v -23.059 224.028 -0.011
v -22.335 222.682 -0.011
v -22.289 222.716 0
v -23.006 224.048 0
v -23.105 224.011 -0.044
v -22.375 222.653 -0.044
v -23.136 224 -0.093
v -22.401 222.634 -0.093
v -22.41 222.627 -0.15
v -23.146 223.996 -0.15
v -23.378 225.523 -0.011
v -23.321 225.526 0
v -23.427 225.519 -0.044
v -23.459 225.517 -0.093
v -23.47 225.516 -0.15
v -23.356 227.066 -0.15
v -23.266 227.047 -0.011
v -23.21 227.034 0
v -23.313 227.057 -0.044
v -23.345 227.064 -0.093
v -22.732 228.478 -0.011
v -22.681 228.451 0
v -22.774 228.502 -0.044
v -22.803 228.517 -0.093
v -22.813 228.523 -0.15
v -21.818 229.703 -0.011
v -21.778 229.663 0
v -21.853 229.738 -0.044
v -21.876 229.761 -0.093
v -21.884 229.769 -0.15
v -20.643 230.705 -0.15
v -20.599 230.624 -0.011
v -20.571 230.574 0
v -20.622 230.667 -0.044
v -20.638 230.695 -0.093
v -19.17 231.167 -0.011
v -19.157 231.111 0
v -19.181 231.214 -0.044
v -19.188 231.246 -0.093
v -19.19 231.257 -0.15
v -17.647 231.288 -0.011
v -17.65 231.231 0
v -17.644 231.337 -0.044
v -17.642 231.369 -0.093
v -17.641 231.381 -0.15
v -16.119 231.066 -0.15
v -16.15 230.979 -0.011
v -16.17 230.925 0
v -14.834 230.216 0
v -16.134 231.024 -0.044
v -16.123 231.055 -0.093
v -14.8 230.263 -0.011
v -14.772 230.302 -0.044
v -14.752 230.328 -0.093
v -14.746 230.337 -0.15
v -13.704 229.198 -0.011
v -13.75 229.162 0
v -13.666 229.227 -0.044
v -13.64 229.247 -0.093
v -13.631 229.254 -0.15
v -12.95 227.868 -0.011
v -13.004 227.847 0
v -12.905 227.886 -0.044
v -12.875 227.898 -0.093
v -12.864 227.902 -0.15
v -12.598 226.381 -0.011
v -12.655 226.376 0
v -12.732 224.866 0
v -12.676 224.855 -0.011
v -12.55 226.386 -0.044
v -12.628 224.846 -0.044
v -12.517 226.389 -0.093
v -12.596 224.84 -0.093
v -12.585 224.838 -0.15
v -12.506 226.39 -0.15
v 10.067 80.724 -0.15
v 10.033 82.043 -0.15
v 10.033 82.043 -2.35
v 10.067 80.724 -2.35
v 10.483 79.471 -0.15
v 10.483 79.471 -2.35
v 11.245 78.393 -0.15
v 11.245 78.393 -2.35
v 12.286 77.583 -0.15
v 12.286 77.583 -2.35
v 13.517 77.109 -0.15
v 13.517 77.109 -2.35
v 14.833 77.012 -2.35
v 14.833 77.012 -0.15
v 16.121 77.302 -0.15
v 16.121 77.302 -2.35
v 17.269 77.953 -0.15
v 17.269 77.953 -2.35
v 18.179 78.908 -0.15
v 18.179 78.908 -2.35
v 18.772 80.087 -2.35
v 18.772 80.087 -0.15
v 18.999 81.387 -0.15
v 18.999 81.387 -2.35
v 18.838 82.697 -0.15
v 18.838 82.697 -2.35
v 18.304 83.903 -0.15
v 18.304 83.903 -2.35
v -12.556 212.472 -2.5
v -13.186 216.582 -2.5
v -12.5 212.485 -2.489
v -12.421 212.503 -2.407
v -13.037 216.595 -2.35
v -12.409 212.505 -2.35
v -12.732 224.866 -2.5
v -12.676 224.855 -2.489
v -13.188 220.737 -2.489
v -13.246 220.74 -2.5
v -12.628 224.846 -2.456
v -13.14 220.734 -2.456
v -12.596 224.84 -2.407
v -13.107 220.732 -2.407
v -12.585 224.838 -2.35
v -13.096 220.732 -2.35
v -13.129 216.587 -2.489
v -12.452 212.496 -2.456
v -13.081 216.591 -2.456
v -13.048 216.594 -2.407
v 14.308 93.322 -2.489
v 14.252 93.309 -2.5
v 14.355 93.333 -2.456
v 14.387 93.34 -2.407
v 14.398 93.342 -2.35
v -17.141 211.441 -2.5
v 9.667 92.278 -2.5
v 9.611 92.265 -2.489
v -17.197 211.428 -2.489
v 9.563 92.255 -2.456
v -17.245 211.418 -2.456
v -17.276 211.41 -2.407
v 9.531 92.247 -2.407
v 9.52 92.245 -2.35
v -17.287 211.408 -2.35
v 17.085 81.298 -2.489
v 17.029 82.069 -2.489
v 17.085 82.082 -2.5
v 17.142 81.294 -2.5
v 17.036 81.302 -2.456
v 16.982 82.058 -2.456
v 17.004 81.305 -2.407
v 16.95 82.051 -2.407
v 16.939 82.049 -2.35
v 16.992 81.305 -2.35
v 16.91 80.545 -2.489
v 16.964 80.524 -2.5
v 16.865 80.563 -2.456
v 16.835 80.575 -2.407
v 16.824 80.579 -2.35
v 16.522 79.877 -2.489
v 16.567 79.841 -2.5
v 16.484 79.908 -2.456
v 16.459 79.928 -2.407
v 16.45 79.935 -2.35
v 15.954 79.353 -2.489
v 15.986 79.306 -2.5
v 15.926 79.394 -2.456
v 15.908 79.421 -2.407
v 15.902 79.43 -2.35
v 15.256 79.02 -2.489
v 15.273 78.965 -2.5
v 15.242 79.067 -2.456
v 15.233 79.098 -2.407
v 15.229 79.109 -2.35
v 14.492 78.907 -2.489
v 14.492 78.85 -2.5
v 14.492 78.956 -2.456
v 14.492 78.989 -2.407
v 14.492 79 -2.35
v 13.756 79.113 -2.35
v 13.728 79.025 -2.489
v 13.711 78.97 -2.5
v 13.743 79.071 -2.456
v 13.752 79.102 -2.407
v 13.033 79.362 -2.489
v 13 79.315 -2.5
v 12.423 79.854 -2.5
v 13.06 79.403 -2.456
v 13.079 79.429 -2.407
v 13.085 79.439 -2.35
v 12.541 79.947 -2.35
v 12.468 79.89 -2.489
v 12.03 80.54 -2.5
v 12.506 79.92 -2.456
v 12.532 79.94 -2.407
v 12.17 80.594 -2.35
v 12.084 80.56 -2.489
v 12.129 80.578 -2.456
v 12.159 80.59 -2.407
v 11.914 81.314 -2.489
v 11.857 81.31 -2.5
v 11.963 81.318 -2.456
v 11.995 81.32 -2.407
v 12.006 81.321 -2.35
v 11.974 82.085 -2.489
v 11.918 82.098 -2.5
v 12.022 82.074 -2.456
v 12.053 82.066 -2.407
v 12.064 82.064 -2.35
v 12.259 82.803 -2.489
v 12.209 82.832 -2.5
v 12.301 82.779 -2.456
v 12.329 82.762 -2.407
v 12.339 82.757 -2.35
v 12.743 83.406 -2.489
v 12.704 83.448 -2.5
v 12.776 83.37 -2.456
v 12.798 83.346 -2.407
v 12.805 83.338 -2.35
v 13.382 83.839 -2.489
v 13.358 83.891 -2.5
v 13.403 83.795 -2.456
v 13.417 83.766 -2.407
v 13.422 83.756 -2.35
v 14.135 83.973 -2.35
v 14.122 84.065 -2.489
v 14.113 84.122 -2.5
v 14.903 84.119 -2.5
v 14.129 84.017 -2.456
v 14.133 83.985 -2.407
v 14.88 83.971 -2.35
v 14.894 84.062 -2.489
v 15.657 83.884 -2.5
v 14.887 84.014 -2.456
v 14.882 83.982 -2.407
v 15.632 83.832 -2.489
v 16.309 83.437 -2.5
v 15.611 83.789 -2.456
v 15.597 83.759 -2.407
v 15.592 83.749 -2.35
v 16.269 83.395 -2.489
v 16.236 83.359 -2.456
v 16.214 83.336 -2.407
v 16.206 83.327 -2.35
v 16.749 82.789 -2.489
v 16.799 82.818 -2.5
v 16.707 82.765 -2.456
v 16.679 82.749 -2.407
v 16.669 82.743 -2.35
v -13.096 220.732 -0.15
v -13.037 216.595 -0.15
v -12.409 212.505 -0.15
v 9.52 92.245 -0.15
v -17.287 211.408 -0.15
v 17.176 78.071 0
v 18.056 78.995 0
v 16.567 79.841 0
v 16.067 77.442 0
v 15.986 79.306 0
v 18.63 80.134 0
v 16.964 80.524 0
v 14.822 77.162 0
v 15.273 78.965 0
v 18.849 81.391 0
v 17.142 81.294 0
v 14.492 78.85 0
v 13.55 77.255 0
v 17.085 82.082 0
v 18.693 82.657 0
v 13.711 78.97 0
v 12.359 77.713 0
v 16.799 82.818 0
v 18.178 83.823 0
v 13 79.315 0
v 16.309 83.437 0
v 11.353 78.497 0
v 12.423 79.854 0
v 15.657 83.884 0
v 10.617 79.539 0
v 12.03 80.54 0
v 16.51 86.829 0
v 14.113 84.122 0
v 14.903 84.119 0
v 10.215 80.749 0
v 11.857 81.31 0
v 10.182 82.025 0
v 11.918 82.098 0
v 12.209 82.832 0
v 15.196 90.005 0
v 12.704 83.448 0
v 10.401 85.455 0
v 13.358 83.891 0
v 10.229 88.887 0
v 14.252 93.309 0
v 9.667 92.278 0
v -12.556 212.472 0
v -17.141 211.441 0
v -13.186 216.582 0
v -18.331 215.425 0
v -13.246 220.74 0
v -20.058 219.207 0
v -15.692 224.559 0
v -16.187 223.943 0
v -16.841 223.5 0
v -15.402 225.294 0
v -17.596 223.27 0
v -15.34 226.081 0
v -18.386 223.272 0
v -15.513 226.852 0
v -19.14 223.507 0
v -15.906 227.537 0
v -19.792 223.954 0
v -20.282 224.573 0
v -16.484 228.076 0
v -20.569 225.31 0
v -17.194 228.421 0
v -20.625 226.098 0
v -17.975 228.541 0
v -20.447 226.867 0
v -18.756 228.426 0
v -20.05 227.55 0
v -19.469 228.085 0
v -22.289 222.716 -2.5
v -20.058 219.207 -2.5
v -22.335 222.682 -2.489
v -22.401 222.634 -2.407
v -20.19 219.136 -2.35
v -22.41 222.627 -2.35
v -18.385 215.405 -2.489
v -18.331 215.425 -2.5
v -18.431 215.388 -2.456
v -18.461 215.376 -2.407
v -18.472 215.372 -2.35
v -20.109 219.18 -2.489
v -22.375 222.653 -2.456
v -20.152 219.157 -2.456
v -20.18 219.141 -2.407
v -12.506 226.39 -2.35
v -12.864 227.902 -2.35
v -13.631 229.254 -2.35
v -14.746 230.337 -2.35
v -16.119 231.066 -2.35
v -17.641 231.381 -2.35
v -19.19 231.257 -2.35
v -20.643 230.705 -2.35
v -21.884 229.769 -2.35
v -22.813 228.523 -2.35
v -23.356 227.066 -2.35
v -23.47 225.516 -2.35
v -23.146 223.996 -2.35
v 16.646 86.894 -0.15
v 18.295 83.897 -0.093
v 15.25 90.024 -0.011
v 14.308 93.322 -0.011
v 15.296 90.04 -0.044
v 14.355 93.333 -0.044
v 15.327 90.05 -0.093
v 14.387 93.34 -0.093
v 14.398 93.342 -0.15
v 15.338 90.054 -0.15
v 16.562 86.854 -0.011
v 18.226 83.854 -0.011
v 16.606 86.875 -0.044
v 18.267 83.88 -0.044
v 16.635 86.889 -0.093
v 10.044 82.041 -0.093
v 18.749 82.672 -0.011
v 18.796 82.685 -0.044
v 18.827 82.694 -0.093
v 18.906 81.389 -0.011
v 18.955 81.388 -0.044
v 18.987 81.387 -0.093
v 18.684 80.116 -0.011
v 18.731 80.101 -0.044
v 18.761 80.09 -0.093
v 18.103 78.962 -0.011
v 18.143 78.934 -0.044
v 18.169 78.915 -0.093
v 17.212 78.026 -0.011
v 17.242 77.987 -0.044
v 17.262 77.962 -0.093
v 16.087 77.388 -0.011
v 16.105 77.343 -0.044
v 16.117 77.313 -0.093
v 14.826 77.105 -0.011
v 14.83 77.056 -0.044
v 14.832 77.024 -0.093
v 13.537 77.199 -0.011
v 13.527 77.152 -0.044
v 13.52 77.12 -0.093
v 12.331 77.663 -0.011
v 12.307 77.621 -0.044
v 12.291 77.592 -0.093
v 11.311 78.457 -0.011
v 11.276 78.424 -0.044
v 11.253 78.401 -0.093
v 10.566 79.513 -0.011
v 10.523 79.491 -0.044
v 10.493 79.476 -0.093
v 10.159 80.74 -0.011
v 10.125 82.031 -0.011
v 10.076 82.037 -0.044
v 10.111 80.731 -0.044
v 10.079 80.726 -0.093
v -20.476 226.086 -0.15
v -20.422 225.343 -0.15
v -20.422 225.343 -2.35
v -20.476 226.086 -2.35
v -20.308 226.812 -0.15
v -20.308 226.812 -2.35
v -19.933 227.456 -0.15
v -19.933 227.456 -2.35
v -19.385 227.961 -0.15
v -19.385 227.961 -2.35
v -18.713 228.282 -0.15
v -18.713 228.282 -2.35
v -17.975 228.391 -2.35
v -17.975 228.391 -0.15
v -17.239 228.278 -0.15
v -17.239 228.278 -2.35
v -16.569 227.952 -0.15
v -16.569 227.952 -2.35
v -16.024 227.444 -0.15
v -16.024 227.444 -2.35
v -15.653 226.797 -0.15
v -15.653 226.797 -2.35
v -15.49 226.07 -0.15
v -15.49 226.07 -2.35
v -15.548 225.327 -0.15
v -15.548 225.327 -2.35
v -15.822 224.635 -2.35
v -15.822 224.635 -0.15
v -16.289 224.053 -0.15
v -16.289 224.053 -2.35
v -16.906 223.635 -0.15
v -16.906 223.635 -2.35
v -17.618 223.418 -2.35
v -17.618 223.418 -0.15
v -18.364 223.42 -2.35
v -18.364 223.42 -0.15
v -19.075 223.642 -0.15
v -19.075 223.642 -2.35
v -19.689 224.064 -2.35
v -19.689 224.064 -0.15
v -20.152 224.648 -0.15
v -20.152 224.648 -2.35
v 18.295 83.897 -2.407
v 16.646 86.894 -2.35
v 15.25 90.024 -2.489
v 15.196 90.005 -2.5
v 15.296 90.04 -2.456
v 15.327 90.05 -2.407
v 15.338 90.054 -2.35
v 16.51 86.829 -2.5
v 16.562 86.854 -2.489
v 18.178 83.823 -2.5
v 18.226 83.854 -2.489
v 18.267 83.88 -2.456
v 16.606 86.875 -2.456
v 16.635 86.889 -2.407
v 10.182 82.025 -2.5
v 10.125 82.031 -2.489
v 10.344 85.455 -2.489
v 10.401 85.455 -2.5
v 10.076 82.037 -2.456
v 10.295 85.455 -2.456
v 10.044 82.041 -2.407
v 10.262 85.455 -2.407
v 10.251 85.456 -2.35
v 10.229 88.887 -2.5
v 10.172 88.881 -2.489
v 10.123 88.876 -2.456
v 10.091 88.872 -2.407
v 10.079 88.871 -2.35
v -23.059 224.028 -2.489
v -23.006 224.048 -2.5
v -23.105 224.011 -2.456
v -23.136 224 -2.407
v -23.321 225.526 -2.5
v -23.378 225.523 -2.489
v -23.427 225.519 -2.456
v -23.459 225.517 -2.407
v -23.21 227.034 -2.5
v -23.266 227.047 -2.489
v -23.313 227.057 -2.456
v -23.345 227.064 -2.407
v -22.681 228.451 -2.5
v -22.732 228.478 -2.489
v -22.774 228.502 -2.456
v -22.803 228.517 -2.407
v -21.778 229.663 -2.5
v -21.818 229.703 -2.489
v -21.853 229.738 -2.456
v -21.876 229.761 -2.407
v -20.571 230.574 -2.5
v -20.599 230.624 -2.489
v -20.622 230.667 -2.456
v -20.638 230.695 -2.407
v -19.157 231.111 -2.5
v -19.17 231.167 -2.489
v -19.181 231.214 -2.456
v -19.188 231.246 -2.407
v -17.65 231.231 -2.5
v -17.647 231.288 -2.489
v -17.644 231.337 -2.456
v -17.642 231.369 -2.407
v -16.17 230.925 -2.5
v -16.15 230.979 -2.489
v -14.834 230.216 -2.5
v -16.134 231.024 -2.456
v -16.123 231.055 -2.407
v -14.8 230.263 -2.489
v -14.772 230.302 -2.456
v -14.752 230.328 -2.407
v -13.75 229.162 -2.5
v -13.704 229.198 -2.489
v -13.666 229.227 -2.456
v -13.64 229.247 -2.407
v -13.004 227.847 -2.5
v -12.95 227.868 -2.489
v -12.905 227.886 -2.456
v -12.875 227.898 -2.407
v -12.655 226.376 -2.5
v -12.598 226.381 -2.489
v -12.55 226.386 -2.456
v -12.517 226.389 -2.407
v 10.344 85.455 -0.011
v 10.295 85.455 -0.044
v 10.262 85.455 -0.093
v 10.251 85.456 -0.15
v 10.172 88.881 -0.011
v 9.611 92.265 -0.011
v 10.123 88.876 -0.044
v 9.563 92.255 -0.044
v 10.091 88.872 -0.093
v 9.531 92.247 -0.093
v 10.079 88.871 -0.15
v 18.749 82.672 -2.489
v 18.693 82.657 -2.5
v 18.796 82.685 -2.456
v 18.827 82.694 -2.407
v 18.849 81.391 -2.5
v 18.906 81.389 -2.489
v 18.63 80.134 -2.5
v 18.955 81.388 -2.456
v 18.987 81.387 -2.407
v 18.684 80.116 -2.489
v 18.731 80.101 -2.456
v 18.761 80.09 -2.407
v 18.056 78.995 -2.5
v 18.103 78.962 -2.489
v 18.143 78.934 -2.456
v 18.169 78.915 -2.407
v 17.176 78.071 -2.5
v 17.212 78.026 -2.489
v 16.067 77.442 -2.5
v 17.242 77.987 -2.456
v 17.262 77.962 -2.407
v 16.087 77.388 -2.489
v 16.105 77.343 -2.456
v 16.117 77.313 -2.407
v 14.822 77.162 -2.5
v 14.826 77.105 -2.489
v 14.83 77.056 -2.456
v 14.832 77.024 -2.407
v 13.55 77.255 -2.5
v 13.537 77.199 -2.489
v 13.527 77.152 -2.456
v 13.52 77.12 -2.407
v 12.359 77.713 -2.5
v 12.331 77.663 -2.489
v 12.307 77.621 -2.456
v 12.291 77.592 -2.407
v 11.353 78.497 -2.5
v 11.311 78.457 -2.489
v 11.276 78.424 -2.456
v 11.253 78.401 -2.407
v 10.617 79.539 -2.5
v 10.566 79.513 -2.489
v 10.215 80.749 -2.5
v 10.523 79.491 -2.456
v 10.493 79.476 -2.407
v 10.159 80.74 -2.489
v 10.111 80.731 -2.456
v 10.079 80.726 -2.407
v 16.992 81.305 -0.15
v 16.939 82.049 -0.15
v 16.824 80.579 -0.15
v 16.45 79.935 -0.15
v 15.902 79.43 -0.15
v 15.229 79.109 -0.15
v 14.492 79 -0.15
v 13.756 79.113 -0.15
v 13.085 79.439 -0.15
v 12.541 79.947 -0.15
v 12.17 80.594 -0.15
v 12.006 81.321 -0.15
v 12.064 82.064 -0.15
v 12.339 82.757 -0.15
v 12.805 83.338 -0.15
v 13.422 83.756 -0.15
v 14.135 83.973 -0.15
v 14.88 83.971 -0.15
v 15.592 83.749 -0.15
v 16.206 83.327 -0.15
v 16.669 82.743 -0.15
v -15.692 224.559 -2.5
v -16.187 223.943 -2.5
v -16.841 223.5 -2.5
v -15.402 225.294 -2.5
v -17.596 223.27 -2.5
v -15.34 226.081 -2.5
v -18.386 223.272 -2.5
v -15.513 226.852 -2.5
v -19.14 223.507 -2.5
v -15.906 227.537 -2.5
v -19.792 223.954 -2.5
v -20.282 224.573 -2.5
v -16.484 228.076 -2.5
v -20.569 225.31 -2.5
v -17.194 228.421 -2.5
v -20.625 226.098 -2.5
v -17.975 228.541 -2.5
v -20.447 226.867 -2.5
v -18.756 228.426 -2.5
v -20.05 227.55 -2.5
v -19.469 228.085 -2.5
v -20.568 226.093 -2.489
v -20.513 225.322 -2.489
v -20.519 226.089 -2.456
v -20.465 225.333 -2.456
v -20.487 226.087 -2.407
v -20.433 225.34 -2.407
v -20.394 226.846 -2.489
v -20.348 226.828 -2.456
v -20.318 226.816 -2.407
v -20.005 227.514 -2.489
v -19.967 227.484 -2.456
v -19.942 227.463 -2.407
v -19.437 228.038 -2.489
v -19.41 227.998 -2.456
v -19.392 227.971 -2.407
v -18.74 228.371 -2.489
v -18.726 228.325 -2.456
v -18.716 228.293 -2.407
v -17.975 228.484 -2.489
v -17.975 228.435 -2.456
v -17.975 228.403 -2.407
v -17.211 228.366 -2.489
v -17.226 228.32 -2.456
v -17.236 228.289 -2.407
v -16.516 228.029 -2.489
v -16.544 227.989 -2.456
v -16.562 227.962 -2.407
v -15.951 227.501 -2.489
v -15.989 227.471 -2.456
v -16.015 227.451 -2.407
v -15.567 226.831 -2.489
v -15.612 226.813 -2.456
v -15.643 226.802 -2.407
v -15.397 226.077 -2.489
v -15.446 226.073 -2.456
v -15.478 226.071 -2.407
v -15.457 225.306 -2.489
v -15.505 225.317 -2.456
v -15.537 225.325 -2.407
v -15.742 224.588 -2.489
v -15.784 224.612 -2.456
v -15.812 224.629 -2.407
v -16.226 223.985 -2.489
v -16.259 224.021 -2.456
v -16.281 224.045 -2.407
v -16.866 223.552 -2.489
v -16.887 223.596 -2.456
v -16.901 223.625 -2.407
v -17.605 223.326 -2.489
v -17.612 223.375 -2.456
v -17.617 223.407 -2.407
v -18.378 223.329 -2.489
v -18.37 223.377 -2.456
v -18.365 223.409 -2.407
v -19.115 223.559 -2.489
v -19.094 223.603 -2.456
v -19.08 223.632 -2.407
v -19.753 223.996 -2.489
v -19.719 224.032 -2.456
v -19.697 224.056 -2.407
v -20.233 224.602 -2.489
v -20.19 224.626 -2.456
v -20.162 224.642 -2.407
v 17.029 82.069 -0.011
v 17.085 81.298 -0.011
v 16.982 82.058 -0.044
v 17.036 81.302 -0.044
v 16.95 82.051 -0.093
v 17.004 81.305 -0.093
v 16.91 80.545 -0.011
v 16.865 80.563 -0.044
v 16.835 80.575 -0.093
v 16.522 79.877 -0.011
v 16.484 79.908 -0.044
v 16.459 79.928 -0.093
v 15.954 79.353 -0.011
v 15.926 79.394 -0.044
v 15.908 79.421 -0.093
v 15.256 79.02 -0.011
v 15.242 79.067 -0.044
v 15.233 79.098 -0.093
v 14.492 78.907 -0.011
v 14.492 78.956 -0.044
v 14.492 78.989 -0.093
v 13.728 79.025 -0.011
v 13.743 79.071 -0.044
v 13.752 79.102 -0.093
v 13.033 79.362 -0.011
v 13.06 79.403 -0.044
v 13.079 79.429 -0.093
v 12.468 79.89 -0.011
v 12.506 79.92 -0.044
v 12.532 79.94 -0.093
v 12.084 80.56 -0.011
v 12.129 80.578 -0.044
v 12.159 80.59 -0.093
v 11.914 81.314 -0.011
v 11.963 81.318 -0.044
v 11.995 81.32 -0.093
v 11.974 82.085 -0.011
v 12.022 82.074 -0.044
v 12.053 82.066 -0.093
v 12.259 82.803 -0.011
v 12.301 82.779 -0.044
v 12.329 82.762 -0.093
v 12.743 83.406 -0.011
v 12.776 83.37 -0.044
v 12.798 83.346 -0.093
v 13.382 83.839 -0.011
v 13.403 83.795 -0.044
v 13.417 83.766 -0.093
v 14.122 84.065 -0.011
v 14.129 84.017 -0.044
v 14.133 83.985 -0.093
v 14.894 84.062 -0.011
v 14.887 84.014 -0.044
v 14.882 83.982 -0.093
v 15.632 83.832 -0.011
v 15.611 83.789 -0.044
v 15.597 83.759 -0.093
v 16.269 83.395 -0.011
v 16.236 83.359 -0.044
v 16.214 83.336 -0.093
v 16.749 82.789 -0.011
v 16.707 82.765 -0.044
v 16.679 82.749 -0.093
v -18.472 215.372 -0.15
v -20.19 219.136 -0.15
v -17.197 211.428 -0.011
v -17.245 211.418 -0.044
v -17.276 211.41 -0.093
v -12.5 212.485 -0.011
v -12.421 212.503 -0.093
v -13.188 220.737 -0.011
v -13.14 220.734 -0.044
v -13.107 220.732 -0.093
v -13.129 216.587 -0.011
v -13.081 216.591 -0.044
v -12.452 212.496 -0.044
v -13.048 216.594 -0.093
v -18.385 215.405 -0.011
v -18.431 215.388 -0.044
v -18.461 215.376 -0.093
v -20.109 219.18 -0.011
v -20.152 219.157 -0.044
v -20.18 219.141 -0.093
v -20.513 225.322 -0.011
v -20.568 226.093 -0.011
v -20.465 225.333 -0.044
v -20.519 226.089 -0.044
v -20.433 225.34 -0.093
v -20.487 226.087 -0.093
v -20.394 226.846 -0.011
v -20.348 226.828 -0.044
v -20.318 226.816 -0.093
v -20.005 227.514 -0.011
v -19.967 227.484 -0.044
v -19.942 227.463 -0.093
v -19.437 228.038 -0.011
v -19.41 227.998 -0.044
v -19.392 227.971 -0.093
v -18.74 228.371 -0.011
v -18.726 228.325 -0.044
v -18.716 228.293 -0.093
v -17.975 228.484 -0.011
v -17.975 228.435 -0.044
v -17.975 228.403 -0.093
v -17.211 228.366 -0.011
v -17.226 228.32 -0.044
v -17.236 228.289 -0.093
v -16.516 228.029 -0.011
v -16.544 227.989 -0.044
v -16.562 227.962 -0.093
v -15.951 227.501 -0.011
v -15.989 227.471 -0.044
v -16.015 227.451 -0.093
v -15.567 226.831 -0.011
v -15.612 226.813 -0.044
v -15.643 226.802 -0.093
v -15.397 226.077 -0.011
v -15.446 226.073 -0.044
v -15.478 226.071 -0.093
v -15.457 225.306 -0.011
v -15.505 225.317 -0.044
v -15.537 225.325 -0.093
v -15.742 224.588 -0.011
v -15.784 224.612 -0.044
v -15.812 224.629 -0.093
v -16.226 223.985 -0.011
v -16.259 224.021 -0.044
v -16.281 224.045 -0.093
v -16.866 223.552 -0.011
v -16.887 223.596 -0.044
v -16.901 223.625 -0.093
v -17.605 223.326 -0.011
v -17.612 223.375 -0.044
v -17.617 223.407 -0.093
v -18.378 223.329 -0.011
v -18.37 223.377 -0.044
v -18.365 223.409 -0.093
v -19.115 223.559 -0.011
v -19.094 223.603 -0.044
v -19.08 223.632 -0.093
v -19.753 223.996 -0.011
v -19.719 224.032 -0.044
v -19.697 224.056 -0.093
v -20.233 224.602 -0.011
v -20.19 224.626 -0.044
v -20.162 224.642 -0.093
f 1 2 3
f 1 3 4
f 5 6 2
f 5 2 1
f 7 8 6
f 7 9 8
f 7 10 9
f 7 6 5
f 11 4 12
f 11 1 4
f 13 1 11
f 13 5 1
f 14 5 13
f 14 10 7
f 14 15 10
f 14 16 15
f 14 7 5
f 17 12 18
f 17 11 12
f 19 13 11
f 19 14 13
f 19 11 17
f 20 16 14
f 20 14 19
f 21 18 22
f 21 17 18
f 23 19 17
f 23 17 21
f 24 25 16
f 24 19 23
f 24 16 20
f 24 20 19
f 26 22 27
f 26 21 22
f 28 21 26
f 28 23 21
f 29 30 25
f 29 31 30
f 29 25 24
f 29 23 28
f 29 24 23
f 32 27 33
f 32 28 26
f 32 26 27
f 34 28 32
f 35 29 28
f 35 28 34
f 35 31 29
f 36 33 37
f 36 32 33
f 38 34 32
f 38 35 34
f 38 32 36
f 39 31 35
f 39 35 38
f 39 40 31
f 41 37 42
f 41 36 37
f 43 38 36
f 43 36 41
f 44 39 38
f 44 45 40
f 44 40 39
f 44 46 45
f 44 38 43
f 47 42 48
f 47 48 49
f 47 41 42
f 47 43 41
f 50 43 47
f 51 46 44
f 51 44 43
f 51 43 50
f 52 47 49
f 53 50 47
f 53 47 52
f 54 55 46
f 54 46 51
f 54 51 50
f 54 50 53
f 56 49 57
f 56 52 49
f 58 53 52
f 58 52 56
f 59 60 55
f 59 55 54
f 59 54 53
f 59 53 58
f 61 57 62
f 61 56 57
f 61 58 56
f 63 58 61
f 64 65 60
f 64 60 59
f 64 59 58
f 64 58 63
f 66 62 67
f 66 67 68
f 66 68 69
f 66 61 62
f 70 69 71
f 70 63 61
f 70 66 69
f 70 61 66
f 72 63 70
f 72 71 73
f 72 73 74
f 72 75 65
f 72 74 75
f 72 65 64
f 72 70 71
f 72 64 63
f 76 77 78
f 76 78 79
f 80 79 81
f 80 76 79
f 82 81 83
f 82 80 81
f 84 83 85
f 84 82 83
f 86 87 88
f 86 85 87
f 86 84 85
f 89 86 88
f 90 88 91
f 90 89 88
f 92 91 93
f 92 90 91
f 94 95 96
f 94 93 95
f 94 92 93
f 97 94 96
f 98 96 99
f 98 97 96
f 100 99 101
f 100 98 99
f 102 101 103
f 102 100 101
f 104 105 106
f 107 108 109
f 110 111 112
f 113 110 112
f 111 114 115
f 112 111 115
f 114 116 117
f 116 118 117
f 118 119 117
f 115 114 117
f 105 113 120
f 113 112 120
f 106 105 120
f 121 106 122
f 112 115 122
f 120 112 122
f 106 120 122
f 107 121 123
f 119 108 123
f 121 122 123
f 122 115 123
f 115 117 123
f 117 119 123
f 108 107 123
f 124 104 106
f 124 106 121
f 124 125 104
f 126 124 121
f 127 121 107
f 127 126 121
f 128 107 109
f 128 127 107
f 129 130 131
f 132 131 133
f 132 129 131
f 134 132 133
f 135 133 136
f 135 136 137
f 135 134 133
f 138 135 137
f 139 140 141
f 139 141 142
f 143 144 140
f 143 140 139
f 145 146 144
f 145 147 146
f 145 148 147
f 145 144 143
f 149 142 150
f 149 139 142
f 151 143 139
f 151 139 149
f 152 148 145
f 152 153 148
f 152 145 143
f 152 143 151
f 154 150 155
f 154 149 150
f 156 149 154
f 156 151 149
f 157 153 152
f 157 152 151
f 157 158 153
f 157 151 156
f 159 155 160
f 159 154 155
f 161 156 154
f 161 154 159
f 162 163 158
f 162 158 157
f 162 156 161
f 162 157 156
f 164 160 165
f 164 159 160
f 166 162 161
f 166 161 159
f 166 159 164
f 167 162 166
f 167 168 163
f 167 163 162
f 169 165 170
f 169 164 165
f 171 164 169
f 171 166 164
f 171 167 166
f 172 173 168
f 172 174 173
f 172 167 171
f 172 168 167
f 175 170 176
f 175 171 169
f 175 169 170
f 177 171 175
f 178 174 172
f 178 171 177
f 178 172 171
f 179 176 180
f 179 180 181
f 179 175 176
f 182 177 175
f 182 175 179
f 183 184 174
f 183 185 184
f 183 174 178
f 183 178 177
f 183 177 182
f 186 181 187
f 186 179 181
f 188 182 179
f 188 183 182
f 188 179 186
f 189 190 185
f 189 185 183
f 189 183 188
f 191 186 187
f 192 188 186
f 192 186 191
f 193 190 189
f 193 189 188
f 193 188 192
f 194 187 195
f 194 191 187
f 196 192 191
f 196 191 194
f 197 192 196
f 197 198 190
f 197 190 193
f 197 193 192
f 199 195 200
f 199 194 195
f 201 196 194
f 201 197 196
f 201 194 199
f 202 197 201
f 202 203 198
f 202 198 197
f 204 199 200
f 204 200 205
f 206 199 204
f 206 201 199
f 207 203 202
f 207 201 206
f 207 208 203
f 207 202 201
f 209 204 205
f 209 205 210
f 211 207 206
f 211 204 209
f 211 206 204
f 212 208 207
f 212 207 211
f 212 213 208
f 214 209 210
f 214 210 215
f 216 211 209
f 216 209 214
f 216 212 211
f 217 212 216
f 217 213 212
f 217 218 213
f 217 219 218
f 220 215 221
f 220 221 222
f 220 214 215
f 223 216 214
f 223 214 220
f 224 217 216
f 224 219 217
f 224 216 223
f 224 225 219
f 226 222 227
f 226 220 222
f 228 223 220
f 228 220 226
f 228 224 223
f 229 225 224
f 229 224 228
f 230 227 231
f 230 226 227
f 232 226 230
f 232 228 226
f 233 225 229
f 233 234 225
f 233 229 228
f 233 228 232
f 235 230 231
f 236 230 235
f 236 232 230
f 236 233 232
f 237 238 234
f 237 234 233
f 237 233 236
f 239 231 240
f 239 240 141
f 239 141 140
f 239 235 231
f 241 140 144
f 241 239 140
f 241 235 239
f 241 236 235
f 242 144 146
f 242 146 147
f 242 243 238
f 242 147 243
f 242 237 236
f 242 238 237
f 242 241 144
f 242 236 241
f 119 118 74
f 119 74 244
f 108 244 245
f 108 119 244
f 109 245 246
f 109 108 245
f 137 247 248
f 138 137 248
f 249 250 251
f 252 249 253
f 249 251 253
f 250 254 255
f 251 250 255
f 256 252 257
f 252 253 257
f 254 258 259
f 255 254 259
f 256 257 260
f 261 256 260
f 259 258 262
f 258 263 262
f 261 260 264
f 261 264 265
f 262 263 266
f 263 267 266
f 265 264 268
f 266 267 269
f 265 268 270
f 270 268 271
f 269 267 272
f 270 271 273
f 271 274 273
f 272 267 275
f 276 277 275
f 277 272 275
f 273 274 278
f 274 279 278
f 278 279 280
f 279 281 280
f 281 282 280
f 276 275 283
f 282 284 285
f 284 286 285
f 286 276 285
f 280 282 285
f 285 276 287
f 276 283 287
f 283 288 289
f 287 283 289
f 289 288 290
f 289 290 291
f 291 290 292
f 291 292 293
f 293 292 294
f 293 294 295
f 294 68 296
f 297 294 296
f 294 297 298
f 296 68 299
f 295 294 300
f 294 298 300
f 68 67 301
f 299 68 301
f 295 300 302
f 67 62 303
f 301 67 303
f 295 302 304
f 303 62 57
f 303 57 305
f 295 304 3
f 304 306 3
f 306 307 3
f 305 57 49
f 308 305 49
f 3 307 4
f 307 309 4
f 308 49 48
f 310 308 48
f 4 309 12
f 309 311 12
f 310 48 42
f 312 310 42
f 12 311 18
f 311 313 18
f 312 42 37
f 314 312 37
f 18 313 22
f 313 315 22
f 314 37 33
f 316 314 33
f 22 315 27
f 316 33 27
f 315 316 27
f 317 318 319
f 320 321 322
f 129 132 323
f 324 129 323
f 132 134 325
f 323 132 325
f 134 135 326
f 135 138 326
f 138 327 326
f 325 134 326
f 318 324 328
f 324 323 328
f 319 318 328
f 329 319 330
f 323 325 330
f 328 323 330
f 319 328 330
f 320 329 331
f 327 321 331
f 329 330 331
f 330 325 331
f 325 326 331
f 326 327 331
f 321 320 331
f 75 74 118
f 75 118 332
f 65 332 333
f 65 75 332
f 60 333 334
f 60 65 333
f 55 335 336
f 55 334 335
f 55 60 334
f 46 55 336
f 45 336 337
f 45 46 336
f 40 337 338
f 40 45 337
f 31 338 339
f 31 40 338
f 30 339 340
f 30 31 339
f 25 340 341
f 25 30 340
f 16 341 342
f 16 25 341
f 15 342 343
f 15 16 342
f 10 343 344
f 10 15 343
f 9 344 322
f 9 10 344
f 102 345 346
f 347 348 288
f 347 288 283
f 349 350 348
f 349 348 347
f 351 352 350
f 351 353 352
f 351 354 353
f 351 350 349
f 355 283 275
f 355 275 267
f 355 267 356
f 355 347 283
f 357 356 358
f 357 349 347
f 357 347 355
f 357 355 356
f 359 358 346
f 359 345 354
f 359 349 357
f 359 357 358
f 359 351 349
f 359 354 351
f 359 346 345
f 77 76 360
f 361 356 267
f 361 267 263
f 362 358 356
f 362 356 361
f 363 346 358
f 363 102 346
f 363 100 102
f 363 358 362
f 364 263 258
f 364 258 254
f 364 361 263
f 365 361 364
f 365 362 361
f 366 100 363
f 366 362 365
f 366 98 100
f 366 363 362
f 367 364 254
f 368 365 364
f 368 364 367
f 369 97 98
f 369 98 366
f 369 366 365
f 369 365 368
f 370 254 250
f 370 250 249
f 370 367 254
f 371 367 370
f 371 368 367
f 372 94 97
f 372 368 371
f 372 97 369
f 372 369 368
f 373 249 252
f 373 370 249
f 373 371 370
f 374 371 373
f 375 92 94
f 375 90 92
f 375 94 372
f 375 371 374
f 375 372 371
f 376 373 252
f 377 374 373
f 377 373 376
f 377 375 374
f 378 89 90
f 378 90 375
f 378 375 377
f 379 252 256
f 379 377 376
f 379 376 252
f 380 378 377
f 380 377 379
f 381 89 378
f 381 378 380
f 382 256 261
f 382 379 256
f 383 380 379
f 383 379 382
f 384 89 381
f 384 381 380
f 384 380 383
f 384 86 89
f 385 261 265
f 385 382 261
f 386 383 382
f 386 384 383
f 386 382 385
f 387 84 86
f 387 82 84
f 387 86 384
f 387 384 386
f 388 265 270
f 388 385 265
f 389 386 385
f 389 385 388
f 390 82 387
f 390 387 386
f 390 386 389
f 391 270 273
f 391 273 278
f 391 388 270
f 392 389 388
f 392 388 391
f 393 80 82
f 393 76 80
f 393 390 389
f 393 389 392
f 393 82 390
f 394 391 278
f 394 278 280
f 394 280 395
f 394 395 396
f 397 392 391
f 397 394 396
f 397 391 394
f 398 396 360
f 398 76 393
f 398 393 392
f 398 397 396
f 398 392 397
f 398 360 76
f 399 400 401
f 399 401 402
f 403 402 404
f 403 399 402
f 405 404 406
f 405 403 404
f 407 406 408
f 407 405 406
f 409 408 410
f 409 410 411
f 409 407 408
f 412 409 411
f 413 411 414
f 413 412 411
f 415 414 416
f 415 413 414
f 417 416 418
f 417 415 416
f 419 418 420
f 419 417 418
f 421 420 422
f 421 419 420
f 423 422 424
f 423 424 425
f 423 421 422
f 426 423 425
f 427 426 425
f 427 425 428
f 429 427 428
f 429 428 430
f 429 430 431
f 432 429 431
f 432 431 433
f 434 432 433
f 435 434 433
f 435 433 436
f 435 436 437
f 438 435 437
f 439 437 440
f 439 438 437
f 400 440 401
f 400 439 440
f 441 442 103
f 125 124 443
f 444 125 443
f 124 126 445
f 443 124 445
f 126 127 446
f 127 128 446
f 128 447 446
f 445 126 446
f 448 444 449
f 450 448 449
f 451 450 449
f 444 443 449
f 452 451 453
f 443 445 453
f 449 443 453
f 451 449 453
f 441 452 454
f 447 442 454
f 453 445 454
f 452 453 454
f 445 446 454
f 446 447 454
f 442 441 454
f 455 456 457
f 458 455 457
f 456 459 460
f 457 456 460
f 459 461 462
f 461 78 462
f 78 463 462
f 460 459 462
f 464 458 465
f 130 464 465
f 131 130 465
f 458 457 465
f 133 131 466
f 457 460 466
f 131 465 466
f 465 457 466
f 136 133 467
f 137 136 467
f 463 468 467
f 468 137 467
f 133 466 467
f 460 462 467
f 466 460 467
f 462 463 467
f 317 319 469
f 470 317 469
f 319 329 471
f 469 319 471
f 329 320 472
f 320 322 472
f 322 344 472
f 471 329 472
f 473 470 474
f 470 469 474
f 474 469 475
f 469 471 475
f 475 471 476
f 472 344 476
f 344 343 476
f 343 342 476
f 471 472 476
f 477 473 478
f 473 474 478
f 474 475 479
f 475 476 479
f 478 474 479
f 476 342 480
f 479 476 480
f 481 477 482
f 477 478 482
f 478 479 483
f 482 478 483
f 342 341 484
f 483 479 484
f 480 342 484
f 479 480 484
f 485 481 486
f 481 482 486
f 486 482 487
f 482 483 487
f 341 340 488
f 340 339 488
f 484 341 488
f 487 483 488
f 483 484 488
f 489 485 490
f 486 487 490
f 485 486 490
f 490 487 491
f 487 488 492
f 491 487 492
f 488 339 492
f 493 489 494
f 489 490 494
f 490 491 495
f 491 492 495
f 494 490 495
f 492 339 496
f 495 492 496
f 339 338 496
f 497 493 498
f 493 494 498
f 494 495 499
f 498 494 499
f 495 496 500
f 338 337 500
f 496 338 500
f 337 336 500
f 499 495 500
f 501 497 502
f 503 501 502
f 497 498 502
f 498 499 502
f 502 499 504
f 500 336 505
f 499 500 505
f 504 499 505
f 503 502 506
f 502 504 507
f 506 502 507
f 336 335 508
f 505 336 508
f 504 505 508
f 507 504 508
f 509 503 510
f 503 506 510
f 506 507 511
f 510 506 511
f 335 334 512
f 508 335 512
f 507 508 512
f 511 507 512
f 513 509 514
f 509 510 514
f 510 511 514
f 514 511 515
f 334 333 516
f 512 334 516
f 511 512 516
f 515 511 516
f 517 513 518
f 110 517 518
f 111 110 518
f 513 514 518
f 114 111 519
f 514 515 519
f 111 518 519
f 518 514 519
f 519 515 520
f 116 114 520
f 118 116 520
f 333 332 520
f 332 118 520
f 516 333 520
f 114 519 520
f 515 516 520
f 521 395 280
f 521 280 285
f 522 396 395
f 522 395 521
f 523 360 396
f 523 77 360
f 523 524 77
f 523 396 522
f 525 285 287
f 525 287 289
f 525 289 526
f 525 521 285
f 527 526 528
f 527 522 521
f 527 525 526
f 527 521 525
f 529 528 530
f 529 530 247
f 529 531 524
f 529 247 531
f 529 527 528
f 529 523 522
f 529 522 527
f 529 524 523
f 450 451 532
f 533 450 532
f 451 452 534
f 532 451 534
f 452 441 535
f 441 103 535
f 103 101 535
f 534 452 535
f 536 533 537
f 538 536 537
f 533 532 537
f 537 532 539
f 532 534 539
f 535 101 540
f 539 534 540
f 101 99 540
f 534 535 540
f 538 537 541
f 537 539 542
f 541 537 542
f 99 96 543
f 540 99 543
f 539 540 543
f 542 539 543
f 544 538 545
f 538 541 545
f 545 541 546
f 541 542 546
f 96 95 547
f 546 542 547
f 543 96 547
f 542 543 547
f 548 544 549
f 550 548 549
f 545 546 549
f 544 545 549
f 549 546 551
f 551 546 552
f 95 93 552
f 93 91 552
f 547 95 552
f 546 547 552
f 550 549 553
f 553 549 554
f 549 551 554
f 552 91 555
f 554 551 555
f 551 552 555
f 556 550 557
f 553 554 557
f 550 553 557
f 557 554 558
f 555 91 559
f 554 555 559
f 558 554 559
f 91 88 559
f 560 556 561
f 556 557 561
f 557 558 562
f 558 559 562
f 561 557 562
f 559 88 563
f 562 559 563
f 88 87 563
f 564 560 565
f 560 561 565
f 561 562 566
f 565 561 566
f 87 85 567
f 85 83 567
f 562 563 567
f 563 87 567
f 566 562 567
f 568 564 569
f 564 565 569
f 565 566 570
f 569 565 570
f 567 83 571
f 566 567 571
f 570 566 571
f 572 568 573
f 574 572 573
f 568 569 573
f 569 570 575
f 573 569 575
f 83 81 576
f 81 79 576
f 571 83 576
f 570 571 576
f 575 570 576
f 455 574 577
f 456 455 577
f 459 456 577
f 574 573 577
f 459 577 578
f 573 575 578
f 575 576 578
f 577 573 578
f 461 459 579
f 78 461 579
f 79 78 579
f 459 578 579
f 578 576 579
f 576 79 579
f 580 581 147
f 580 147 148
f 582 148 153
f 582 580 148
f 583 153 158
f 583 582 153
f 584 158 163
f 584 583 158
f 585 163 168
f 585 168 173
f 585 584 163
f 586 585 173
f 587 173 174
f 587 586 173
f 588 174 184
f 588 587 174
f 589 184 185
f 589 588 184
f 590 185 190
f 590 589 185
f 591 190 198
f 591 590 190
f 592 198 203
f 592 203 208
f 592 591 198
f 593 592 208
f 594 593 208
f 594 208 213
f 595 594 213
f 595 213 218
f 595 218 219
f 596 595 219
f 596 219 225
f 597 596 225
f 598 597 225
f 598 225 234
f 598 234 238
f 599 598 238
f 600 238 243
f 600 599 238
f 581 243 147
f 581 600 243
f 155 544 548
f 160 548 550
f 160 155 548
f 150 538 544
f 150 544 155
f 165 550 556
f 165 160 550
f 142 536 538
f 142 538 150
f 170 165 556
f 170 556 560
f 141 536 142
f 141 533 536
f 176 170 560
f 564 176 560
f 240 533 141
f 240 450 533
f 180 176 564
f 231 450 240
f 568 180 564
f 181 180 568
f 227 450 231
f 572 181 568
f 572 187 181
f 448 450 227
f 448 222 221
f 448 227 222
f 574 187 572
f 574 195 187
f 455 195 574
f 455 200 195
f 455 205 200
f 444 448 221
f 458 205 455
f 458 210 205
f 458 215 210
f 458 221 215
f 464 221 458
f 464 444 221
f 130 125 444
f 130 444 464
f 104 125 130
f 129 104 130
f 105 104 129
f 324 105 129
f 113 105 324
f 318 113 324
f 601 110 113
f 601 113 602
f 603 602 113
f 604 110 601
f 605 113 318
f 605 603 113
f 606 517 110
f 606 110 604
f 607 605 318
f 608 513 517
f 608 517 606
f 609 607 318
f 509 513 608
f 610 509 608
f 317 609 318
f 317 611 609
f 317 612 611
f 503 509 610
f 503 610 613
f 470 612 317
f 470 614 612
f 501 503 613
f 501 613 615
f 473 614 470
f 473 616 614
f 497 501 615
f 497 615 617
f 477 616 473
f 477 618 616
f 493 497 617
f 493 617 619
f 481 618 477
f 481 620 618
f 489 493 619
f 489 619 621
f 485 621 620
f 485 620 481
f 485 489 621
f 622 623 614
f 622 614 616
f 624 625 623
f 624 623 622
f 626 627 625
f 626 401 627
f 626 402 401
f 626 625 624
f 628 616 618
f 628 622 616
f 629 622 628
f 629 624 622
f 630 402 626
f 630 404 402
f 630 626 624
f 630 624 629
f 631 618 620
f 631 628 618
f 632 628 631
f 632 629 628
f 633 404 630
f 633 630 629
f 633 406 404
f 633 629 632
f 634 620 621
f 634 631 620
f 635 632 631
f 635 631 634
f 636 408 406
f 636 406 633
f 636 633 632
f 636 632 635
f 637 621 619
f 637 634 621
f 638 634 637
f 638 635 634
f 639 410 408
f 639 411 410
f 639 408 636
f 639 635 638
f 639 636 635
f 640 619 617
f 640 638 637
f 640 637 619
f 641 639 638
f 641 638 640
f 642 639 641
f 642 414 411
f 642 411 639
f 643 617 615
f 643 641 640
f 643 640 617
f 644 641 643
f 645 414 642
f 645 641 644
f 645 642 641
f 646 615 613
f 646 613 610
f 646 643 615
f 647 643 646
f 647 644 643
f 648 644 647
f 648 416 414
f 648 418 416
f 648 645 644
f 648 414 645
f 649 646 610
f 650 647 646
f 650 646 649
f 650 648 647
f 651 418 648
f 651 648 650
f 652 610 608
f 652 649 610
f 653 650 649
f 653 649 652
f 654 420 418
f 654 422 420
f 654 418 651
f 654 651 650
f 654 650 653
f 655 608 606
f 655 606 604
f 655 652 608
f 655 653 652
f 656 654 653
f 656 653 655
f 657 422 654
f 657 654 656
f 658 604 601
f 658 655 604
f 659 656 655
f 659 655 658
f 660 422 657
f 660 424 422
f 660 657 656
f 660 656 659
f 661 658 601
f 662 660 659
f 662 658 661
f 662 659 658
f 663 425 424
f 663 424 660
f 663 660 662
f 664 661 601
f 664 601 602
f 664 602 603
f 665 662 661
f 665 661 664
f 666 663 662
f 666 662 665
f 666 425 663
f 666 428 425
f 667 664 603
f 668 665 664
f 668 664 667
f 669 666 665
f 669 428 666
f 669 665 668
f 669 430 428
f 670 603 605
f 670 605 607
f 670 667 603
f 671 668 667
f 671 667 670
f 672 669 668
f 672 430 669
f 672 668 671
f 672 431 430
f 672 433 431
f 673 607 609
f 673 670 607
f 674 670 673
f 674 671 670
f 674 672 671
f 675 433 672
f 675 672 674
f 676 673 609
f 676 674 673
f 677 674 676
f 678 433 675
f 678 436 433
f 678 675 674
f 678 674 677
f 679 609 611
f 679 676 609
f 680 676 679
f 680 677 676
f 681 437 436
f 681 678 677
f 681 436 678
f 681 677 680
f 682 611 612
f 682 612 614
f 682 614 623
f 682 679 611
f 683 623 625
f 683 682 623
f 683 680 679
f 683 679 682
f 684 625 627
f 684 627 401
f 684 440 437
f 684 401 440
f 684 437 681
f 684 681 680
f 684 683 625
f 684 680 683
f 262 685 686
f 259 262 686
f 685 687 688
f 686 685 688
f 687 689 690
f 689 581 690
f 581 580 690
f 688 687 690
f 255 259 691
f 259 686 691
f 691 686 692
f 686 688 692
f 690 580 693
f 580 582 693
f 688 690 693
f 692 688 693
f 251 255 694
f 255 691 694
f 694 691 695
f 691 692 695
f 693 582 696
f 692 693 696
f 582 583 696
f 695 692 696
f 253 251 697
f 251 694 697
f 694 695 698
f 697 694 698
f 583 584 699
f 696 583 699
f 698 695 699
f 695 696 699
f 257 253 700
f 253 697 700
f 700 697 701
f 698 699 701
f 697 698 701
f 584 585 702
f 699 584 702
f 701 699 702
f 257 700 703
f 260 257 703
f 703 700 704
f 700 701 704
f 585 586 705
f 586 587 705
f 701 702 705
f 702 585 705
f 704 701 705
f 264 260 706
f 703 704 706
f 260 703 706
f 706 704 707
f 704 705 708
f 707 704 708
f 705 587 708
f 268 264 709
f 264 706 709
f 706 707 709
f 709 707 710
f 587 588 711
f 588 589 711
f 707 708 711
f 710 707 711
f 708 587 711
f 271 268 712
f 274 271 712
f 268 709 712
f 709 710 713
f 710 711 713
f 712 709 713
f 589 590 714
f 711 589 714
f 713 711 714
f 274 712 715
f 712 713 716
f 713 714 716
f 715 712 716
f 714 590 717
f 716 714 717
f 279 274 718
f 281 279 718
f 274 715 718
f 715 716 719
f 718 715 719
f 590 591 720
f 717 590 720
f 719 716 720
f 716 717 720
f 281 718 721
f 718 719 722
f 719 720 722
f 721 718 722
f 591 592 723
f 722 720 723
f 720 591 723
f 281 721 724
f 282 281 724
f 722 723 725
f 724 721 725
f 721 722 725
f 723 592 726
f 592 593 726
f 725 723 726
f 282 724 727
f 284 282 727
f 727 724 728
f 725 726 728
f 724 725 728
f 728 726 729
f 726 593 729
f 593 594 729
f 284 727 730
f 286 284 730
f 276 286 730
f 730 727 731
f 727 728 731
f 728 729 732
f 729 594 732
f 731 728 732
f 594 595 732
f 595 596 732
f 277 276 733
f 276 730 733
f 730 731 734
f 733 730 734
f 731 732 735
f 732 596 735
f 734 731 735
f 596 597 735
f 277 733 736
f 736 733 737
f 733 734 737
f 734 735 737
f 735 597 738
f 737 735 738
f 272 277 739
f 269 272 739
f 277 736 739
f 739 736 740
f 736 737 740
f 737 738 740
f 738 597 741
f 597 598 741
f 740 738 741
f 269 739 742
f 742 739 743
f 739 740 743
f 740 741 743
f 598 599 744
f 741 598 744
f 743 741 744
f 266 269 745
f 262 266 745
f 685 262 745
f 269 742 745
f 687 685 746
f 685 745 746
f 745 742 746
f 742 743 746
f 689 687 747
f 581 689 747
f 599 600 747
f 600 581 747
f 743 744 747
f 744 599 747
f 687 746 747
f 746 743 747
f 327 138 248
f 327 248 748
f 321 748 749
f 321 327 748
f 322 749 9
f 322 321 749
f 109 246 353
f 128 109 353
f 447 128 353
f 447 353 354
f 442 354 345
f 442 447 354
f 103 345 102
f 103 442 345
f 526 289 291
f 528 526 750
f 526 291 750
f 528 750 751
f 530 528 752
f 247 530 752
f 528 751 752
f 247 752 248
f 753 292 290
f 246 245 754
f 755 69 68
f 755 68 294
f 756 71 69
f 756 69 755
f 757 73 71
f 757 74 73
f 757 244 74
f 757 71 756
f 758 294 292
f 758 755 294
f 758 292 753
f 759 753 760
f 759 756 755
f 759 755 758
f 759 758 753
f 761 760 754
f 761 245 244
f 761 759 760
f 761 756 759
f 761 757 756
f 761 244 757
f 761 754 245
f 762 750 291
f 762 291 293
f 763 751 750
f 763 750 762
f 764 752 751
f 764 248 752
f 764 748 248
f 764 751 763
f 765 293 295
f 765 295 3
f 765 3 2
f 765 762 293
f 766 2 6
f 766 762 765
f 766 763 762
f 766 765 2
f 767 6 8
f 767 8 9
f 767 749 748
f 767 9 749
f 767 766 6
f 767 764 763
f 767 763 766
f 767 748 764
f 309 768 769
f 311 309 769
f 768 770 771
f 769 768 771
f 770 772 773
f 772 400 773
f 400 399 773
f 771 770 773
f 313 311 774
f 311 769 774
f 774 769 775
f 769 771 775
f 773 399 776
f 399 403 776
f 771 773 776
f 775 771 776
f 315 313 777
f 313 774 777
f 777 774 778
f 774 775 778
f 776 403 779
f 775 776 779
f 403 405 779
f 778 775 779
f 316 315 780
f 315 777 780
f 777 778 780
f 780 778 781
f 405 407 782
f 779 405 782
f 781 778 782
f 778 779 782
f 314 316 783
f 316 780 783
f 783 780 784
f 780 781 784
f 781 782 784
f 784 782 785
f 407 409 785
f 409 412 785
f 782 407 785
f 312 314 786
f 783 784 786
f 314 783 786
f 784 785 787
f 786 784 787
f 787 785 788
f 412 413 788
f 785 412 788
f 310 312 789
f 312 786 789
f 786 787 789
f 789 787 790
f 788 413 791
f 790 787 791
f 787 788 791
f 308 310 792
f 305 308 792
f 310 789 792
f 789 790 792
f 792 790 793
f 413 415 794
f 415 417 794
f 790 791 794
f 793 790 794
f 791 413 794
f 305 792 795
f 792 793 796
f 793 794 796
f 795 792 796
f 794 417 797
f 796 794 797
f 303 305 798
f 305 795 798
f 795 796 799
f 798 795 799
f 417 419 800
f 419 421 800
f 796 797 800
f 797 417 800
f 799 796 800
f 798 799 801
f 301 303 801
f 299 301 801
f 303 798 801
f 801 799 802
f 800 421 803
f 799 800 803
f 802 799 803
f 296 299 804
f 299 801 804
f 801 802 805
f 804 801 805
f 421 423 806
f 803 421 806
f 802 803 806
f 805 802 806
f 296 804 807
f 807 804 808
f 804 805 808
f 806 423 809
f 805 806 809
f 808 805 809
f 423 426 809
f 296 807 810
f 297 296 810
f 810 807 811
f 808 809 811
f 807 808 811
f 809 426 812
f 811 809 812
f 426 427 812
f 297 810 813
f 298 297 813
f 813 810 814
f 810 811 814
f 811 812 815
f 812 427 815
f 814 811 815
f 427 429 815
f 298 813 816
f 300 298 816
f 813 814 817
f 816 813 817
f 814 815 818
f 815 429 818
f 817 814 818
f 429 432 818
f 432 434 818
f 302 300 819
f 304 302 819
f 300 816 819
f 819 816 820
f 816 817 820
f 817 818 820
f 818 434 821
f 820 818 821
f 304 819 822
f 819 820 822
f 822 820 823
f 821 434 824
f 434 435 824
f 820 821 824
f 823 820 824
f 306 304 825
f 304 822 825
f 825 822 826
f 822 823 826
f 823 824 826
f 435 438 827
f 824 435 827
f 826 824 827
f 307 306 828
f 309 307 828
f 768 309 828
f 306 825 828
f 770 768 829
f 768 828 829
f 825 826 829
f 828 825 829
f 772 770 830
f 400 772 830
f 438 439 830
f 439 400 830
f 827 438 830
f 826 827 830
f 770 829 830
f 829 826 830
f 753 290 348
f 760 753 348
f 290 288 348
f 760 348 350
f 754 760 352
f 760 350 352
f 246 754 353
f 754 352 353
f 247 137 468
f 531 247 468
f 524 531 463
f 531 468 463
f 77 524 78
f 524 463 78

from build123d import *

# Parameters (mm, degrees)
BOSS_EXTRUDE1_DEPTH = 2.5
FILLET1_R           = 30
FILLET2_R           = 0.15


with BuildPart() as part:
    # Sketch1 → Boss-Extrude1 (new body)
    with BuildSketch(Plane.XY):
        with BuildLine():
            Line((12.060958277, 80.951296551), (-20.422285901, 225.342566543))
            ThreePointArc((-20.422285901, 225.342566543), (-17.434540729, 223.452228269), (-15.544202455, 226.439973441))
            Line((-15.544202455, 226.439973441), (16.939041723, 82.048703449))
            ThreePointArc((16.939041723, 82.048703449), (13.951296551, 83.939041723), (12.060958277, 80.951296551))
        make_face()
        with BuildLine():
            ThreePointArc((-14.468967679, 221.660447295), (-19.190391766, 231.257161782), (-19.347051125, 220.563040398))
            Line((-19.347051125, 220.563040398), (-20.422285901, 225.342566543))
            ThreePointArc((-20.422285901, 225.342566543), (-18.531947627, 228.330311715), (-15.544202455, 226.439973441))
            Line((-15.544202455, 226.439973441), (-14.468967679, 221.660447295))
        make_face()
        with BuildLine():
            ThreePointArc((16.939041723, 82.048703449), (15.048703449, 79.060958277), (12.060958277, 80.951296551))
            Line((12.060958277, 80.951296551), (11.239734152, 84.601719942))
            ThreePointArc((11.239734152, 84.601719942), (15.487666208, 77.109724899), (16.117817598, 85.69912684))
            Line((16.117817598, 85.69912684), (16.939041723, 82.048703449))
        make_face()
    extrude(amount=-BOSS_EXTRUDE1_DEPTH)

    # Fillet1
    fillet1_edges = [part.edges().sort_by_distance(p)[0] for p in [
        (-19.347051125, 220.563040398, -1.25),
        (-14.468967679, 221.660447295, -1.25),
        (16.117817598, 85.69912684, -1.25),
        (11.239734152, 84.601719942, -1.25),
    ]]
    fillet(fillet1_edges, radius=FILLET1_R)

    # Fillet2
    fillet2_edges = [part.edges().sort_by_distance(p)[0] for p in [
        (0.994489871, 152.923831522, 0),
        (0.994489871, 152.923831522, -2.5),
        (-19.190391766, 231.257161782, 0),
        (-19.190391766, 231.257161782, -2.5),
        (-17.434540729, 223.452228269, -2.5),
        (-3.883593575, 151.826424625, 0),
        (-3.883593575, 151.826424625, -2.5),
        (15.487666208, 77.109724899, 0),
        (15.487666208, 77.109724899, -2.5),
        (-13.137834588, 218.662323044, 0),
        (-13.137834588, 218.662323044, -2.5),
        (-19.265962453, 217.283697634, 0),
        (-19.265962453, 217.283697634, -2.5),
        (10.213987054, 87.165747363, 0),
        (15.048703449, 79.060958277, -2.5),
        (10.213987054, 87.165747363, -2.5),
        (15.946671133, 88.455411044, 0),
        (15.946671133, 88.455411044, -2.5),
        (15.048703449, 79.060958277, 0),
        (-17.434540729, 223.452228269, 0),
    ]]
    fillet(fillet2_edges, radius=FILLET2_R)


solid = part.part
